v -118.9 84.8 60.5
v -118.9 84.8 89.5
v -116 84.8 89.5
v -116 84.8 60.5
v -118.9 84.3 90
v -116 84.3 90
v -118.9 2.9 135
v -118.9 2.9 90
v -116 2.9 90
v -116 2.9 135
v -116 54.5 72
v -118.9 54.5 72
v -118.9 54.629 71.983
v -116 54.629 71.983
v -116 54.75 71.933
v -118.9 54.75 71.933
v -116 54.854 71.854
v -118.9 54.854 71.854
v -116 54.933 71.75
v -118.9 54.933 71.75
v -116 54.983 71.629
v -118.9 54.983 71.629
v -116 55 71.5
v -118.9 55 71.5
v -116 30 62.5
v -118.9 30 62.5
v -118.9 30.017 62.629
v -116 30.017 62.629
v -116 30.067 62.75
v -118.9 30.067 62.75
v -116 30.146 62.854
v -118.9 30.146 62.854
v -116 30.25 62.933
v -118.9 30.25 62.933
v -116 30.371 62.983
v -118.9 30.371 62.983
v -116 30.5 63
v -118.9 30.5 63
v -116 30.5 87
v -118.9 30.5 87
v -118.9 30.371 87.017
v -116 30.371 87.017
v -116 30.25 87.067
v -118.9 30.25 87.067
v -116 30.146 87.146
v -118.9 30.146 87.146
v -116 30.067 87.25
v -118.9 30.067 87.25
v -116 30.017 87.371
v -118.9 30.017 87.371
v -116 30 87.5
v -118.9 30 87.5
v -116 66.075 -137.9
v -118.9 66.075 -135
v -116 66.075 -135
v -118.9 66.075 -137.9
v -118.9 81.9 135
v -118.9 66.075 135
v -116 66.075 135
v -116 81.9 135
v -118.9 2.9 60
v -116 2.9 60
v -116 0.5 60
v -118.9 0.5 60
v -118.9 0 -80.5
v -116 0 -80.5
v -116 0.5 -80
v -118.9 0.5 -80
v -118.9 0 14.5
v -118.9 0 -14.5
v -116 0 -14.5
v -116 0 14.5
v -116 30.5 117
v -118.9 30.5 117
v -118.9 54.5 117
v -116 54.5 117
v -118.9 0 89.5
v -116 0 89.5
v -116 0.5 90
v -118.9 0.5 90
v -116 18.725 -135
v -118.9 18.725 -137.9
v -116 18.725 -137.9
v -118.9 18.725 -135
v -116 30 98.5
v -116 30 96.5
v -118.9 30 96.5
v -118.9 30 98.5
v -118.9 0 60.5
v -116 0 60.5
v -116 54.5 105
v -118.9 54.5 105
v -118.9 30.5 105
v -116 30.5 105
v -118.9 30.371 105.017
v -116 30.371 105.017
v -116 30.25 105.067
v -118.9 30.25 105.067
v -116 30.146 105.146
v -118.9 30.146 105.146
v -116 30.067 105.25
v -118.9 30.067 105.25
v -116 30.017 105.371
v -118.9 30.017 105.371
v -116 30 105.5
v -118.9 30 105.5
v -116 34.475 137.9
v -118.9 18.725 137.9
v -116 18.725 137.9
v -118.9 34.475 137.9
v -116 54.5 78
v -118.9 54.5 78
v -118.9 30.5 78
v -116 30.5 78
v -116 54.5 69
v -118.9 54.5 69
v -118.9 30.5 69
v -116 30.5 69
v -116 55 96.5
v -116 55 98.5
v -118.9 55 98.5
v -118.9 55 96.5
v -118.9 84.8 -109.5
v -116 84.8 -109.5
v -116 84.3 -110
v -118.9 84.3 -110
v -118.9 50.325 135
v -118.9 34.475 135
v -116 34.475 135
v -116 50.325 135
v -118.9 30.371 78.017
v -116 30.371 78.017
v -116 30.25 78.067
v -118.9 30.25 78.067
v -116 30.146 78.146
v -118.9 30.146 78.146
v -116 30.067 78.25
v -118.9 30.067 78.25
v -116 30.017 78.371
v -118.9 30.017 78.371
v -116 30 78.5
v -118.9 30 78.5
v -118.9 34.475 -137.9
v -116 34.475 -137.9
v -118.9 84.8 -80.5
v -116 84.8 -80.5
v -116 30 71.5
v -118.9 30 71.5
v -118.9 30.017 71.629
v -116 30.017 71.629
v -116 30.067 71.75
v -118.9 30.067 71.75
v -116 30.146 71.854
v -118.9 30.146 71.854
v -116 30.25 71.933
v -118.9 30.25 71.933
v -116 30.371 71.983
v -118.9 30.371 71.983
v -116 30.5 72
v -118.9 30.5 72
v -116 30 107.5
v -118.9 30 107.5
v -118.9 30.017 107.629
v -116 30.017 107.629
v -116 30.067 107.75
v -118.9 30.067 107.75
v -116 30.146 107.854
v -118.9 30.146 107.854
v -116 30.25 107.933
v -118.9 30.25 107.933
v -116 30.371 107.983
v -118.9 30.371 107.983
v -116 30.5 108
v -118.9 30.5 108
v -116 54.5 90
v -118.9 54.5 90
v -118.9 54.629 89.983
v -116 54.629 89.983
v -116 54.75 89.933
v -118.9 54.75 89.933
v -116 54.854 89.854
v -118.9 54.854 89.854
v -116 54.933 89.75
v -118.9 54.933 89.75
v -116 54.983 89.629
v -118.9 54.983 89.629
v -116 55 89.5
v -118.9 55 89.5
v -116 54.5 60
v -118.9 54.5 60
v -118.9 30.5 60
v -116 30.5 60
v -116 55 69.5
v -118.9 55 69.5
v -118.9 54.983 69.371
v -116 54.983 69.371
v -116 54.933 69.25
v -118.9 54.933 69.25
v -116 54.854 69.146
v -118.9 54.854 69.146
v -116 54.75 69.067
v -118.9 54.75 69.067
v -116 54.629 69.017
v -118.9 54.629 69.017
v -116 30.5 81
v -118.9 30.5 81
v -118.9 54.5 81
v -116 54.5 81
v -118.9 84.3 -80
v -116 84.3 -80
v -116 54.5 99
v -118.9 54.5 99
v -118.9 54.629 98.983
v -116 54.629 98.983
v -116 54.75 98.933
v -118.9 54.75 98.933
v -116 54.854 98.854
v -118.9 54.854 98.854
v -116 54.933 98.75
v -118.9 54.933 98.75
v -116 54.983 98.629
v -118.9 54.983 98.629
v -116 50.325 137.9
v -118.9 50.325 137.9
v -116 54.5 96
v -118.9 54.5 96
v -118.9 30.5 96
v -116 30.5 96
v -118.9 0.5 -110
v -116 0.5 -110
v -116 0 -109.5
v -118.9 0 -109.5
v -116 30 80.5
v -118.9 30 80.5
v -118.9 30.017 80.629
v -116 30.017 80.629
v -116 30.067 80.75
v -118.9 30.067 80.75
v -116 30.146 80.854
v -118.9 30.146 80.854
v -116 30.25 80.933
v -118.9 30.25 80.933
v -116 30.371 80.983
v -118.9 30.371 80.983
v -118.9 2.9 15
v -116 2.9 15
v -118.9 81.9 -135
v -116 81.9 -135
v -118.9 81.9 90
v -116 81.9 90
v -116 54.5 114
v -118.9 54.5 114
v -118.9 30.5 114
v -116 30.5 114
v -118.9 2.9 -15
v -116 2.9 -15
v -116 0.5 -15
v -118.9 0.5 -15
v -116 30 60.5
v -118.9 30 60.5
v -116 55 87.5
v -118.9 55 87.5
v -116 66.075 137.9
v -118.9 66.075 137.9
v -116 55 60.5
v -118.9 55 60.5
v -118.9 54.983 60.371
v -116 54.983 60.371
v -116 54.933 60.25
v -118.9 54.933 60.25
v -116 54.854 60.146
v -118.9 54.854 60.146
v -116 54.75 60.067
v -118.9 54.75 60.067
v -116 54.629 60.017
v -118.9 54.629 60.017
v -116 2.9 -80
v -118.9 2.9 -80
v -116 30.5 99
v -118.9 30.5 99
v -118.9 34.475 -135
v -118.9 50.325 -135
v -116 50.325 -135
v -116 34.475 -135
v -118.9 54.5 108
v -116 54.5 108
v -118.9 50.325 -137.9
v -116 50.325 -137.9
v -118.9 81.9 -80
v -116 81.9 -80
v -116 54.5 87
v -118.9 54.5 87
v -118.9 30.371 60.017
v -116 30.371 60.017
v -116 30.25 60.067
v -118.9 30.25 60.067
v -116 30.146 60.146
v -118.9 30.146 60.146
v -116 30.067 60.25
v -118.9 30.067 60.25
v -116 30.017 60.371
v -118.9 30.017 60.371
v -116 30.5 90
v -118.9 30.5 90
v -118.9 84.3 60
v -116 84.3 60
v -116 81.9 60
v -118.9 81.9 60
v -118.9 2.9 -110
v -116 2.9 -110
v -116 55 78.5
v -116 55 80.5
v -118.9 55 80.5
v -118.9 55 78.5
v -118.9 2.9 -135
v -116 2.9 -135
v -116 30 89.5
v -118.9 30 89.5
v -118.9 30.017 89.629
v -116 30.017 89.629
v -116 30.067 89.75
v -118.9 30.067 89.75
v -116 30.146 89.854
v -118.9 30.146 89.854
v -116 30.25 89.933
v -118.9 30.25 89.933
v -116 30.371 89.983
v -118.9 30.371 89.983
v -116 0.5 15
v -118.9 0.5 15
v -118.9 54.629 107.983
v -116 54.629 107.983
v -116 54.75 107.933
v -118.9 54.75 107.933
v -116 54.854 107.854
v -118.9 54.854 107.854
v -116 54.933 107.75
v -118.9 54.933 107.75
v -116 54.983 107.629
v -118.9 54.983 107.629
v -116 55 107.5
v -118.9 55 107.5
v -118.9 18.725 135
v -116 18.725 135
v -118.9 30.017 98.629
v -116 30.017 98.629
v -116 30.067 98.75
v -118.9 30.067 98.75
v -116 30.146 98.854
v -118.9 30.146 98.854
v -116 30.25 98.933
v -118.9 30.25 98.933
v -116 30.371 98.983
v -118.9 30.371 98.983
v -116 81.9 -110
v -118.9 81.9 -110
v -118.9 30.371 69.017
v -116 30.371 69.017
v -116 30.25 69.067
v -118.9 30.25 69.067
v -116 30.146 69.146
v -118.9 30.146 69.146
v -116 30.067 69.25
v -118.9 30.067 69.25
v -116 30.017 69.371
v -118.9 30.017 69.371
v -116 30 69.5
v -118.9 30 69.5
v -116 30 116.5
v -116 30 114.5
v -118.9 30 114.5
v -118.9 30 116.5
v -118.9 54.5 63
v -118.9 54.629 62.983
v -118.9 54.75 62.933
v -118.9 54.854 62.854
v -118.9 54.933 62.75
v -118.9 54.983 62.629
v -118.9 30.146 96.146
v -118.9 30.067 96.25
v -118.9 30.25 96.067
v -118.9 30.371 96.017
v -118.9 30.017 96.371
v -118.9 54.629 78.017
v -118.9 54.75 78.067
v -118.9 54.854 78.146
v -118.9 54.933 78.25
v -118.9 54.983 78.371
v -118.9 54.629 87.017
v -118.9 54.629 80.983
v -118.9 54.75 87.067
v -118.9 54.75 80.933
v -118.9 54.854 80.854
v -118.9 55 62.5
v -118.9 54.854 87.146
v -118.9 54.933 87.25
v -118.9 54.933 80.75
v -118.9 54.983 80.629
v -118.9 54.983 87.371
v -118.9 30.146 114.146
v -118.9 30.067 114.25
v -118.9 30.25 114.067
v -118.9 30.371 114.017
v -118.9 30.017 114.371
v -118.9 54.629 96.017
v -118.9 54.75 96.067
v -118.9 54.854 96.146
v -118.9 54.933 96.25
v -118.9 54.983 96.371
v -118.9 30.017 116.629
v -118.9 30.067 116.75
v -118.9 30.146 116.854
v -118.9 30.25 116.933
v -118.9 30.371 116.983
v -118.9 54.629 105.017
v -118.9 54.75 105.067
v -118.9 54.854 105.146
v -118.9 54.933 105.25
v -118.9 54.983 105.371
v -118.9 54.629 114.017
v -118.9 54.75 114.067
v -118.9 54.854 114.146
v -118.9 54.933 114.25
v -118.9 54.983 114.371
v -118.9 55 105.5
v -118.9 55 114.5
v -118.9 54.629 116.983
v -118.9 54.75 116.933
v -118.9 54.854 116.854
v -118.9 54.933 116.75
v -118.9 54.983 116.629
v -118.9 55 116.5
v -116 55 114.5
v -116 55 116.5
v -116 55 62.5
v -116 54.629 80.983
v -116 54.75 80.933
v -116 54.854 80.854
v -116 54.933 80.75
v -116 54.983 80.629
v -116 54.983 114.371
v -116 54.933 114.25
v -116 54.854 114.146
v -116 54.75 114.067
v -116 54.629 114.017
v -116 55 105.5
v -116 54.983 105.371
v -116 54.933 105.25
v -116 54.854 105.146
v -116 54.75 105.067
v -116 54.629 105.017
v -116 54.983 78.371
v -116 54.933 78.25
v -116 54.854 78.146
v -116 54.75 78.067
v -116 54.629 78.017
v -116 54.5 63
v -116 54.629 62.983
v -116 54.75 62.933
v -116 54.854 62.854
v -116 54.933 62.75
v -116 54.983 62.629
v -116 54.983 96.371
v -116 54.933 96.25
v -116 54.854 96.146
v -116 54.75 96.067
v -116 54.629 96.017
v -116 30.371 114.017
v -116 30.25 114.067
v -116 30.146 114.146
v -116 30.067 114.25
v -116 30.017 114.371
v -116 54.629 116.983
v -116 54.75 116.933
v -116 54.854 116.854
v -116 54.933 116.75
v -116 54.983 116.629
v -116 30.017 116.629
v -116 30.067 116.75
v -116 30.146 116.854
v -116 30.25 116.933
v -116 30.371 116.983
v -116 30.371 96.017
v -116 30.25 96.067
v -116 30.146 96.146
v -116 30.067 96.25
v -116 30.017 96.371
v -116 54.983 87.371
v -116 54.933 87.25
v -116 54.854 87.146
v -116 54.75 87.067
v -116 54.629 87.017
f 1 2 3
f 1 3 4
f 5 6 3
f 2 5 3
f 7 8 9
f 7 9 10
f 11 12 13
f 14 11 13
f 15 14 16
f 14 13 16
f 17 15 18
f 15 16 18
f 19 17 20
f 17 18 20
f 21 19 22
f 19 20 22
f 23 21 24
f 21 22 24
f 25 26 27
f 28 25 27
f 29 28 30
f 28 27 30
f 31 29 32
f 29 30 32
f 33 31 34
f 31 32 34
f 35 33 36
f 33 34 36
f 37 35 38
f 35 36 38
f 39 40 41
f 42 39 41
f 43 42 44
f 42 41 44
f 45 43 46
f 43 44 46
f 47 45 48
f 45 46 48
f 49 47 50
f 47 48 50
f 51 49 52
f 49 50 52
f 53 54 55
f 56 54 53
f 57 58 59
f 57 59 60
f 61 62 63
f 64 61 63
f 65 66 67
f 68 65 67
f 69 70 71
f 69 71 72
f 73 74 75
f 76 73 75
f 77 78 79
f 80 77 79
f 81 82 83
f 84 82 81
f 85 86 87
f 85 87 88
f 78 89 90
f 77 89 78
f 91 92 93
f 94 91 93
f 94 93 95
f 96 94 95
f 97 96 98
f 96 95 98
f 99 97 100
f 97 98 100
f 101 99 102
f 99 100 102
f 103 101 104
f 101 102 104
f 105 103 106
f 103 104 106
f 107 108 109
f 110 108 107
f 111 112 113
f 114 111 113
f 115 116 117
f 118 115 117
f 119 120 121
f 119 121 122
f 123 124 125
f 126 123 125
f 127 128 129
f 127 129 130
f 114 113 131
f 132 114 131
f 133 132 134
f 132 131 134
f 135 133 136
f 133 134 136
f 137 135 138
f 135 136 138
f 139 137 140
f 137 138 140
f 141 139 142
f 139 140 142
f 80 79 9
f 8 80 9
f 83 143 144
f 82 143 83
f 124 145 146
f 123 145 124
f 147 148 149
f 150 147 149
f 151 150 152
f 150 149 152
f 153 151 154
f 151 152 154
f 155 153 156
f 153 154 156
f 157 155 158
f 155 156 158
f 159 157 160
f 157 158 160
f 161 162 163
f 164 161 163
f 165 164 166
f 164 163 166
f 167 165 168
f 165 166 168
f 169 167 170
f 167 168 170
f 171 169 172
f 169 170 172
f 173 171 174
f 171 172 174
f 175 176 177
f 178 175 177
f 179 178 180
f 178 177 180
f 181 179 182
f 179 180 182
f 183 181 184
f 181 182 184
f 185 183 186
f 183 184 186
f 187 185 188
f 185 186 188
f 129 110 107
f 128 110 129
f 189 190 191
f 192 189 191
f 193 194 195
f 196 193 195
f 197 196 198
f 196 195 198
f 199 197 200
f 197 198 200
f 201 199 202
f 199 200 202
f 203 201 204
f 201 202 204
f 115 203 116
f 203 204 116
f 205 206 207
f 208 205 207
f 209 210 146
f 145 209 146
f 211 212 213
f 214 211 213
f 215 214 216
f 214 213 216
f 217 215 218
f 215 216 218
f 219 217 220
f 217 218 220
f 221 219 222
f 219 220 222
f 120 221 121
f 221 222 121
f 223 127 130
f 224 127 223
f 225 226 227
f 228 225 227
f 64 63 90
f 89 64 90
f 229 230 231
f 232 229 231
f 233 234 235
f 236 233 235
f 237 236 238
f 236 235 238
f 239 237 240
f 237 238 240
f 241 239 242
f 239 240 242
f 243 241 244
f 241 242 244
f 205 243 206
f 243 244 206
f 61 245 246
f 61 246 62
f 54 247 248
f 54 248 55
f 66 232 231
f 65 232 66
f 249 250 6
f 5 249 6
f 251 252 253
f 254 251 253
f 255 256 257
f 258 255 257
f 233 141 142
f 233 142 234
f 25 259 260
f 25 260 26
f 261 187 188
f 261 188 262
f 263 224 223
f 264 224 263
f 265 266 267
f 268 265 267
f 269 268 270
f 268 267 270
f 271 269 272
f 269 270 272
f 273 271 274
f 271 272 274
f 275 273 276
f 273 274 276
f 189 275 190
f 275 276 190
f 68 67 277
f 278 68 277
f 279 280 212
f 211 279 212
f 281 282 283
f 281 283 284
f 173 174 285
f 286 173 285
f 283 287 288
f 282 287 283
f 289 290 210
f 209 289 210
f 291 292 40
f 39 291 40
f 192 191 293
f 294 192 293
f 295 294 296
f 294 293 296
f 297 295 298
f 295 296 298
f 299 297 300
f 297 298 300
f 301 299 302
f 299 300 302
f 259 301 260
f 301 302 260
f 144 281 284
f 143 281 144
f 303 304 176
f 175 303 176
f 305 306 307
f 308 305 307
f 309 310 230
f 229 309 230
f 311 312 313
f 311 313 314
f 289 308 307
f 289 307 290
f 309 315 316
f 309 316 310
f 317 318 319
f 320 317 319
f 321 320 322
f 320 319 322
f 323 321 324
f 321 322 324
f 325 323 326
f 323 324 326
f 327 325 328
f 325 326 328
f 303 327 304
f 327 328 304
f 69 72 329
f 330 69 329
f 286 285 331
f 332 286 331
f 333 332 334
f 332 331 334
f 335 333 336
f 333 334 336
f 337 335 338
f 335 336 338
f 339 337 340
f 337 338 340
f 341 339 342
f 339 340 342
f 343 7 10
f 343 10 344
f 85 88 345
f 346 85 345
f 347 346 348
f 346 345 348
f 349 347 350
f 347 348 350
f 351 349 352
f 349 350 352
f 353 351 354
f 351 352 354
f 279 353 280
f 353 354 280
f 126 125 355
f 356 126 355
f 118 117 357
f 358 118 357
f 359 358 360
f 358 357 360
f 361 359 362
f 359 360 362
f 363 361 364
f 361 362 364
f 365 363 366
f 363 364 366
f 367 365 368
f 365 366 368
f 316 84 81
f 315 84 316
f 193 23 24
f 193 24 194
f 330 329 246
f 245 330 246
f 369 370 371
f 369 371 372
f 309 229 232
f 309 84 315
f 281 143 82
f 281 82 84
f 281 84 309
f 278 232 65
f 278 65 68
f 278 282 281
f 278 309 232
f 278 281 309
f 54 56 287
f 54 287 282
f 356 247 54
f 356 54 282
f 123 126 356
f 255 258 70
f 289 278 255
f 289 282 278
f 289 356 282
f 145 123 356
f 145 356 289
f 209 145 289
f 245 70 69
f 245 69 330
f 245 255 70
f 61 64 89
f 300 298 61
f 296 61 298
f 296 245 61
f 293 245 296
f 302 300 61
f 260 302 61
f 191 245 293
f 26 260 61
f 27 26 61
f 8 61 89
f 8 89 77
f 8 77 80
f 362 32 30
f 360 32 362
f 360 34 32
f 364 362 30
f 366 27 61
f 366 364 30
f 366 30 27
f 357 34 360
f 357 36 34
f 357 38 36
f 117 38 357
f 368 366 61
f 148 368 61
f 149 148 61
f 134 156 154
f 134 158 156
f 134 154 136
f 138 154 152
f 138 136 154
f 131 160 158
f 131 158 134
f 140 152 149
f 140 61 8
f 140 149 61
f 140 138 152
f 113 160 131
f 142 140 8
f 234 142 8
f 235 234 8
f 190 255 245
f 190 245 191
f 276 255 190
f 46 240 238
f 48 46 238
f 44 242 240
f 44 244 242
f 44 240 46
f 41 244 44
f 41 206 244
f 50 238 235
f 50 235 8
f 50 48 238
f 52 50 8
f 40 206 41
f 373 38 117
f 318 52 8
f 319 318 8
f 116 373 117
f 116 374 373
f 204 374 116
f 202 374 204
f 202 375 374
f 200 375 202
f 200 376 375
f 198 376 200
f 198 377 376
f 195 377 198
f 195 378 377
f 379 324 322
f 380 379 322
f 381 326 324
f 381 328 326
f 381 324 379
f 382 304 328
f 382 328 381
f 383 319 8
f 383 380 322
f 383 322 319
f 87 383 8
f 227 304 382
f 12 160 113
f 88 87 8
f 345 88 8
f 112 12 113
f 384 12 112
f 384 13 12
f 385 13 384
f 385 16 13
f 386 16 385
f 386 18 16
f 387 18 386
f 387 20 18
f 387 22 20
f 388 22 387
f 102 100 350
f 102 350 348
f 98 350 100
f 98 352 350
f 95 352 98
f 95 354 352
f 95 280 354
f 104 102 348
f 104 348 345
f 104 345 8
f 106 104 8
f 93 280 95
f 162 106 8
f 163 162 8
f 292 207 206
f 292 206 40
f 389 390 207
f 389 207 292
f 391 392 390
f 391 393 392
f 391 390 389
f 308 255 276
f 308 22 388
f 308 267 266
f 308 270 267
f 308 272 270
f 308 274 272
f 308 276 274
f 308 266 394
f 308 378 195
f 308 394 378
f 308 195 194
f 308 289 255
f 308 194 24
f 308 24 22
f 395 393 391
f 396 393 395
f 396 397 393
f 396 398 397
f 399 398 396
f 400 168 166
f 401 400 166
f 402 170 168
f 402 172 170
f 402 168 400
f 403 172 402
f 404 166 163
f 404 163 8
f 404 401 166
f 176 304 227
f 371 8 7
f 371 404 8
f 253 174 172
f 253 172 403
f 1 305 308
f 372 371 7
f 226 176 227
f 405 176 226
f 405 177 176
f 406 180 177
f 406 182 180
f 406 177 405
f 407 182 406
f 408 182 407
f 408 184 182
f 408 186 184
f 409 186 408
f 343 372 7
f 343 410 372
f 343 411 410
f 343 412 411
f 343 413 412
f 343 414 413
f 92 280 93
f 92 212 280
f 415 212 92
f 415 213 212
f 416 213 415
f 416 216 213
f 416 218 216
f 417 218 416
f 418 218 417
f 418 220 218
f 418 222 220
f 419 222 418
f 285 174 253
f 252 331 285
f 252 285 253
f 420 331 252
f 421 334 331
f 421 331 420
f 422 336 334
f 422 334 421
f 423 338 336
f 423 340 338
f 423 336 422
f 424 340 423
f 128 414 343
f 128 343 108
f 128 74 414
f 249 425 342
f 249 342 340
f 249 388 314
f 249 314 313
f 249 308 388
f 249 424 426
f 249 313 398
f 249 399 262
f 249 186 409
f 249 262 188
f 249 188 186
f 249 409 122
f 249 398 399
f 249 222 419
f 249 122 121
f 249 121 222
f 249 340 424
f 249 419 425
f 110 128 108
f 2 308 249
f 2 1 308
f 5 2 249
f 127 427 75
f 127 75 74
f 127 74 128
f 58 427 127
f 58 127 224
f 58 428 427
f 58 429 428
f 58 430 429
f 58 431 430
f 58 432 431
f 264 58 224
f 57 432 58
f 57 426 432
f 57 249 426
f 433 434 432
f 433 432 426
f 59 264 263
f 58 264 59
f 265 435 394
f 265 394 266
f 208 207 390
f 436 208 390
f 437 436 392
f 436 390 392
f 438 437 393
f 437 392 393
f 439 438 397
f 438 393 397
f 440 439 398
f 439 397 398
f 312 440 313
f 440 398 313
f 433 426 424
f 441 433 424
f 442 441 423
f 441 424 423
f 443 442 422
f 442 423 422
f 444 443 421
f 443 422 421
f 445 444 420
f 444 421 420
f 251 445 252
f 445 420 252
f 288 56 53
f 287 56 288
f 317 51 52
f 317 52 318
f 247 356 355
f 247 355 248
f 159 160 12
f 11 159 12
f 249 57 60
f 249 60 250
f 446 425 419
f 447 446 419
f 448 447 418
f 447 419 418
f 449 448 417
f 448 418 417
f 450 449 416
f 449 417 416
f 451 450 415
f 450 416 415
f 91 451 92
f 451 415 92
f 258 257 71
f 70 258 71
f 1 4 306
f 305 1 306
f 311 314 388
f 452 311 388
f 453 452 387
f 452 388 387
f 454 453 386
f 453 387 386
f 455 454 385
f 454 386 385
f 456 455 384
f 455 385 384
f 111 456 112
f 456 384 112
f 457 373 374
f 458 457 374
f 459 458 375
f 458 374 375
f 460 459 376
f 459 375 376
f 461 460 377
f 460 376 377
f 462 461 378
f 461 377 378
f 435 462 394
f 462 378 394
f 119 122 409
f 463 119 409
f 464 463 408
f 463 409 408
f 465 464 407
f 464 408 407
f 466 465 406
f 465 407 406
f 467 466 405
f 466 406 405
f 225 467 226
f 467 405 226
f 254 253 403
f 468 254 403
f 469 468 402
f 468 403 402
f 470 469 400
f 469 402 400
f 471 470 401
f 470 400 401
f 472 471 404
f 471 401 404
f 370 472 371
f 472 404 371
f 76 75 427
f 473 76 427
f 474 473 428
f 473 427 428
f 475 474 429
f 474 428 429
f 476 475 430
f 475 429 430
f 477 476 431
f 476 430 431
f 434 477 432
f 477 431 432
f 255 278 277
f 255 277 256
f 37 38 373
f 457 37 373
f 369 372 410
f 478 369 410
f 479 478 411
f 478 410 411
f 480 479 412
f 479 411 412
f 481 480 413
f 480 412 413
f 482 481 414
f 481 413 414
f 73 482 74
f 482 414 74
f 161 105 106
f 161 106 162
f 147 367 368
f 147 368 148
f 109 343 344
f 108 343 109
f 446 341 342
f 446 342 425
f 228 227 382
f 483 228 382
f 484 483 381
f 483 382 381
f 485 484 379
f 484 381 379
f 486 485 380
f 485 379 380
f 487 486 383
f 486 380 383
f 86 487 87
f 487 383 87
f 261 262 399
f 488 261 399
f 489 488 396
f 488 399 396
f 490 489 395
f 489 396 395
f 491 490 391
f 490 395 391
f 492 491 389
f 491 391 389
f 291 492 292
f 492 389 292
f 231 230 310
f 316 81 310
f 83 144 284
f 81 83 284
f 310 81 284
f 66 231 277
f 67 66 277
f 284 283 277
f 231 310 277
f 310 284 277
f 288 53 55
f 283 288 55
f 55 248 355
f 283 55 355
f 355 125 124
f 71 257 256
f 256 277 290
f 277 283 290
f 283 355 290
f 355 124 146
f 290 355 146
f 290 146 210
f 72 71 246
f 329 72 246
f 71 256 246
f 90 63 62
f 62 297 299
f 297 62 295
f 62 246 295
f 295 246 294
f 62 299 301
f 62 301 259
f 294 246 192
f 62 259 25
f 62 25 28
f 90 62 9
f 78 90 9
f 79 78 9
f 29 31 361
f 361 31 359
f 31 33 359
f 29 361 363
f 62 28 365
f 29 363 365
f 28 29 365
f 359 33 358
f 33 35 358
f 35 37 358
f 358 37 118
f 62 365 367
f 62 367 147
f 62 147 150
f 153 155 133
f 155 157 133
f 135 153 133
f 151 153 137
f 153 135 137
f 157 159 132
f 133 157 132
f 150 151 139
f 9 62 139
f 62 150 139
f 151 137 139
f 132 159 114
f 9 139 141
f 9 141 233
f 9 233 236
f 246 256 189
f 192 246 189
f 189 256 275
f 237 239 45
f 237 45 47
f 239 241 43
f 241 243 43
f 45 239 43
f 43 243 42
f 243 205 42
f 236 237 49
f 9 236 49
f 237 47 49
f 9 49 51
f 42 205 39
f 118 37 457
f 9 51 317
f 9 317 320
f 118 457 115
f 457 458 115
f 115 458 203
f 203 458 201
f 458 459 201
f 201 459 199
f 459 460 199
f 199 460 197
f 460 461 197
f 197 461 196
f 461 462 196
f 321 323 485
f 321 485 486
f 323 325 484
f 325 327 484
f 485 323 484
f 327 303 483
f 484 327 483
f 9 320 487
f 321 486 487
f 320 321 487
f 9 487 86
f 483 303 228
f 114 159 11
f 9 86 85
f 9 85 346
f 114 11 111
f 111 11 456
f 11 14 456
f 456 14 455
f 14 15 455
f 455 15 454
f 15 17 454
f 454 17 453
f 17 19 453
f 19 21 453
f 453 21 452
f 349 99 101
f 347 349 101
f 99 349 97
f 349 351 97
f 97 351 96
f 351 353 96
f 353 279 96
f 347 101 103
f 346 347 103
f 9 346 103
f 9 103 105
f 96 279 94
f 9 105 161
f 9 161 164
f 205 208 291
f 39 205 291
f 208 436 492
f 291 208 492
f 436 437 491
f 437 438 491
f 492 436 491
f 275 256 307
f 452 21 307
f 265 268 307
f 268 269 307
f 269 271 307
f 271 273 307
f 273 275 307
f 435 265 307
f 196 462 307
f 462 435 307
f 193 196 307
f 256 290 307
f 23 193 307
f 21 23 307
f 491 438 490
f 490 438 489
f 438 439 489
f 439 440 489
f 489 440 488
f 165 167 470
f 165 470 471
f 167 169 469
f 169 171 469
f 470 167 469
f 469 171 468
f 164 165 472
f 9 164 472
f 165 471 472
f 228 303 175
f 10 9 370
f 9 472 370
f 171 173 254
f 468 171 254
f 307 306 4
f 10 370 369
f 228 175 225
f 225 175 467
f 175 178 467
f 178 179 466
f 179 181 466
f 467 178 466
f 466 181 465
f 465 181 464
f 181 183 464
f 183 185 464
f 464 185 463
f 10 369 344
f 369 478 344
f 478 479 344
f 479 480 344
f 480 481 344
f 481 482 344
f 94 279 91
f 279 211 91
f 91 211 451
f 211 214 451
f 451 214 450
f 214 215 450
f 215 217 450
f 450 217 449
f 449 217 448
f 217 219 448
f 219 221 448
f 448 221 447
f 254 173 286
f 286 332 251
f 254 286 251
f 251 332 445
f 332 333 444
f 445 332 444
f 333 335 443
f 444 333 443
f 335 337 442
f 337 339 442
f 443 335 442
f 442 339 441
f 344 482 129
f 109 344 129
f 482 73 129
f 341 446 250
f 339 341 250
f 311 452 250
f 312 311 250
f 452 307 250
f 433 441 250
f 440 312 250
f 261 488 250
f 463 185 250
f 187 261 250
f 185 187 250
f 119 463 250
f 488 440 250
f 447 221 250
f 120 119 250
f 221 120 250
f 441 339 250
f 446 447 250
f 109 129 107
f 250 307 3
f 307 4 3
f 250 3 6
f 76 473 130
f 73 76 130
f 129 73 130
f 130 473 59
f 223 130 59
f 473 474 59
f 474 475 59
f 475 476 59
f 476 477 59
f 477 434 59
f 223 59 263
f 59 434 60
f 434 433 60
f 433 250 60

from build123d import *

# Parameters (mm, degrees)
BOSS_EXTRUDE1_DEPTH = 2.9


with BuildPart() as part:
    # Sketch1 → Boss-Extrude1 (new body)
    with BuildSketch(Plane(origin=(-118.9, 0, 0), x_dir=(0, 0, -1), z_dir=(1, 0, 0))):
        Polygon((135, 2.9), (110, 2.9), (110, 0.5), (109.5, 0), (80.5, 0), (80, 0.5), (80, 2.9), (15, 2.9), (15, 0.5), (14.5, 0), (-14.5, 0), (-15, 0.5), (-15, 2.9), (-60, 2.9), (-60, 0.5), (-60.5, 0), (-89.5, 0), (-90, 0.5), (-90, 2.9), (-135, 2.9), (-135, 18.725), (-137.9, 18.725), (-137.9, 34.475), (-135, 34.475), (-135, 50.325), (-137.9, 50.325), (-137.9, 66.075), (-135, 66.075), (-135, 81.9), (-90, 81.9), (-90, 84.3), (-89.5, 84.8), (-60.5, 84.8), (-60, 84.3), (-60, 81.9), (80, 81.9), (80, 84.3), (80.5, 84.8), (109.5, 84.8), (110, 84.3), (110, 81.9), (135, 81.9), (135, 66.075), (137.9, 66.075), (137.9, 50.325), (135, 50.325), (135, 34.475), (137.9, 34.475), (137.9, 18.725), (135, 18.725), align=None)
        with BuildLine():
            Line((-114.5, 30), (-116.5, 30))
            ThreePointArc((-116.5, 30), (-116.853553391, 30.146446609), (-117, 30.5))
            Line((-117, 30.5), (-117, 54.5))
            ThreePointArc((-117, 54.5), (-116.853553391, 54.853553391), (-116.5, 55))
            Line((-116.5, 55), (-114.5, 55))
            ThreePointArc((-114.5, 55), (-114.146446609, 54.853553391), (-114, 54.5))
            Line((-114, 54.5), (-114, 30.5))
            ThreePointArc((-114, 30.5), (-114.146446609, 30.146446609), (-114.5, 30))
        make_face(mode=Mode.SUBTRACT)
        with BuildLine():
            Line((-105.5, 30), (-107.5, 30))
            ThreePointArc((-107.5, 30), (-107.853553391, 30.146446609), (-108, 30.5))
            Line((-108, 30.5), (-108, 54.5))
            ThreePointArc((-108, 54.5), (-107.853553391, 54.853553391), (-107.5, 55))
            Line((-107.5, 55), (-105.5, 55))
            ThreePointArc((-105.5, 55), (-105.146446609, 54.853553391), (-105, 54.5))
            Line((-105, 54.5), (-105, 30.5))
            ThreePointArc((-105, 30.5), (-105.146446609, 30.146446609), (-105.5, 30))
        make_face(mode=Mode.SUBTRACT)
        with BuildLine():
            Line((-96.5, 30), (-98.5, 30))
            ThreePointArc((-98.5, 30), (-98.853553391, 30.146446609), (-99, 30.5))
            Line((-99, 30.5), (-99, 54.5))
            ThreePointArc((-99, 54.5), (-98.853553391, 54.853553391), (-98.5, 55))
            Line((-98.5, 55), (-96.5, 55))
            ThreePointArc((-96.5, 55), (-96.146446609, 54.853553391), (-96, 54.5))
            Line((-96, 54.5), (-96, 30.5))
            ThreePointArc((-96, 30.5), (-96.146446609, 30.146446609), (-96.5, 30))
        make_face(mode=Mode.SUBTRACT)
        with BuildLine():
            Line((-87.5, 30), (-89.5, 30))
            ThreePointArc((-89.5, 30), (-89.853553391, 30.146446609), (-90, 30.5))
            Line((-90, 30.5), (-90, 54.5))
            ThreePointArc((-90, 54.5), (-89.853553391, 54.853553391), (-89.5, 55))
            Line((-89.5, 55), (-87.5, 55))
            ThreePointArc((-87.5, 55), (-87.146446609, 54.853553391), (-87, 54.5))
            Line((-87, 54.5), (-87, 30.5))
            ThreePointArc((-87, 30.5), (-87.146446609, 30.146446609), (-87.5, 30))
        make_face(mode=Mode.SUBTRACT)
        with BuildLine():
            Line((-78.5, 30), (-80.5, 30))
            ThreePointArc((-80.5, 30), (-80.853553391, 30.146446609), (-81, 30.5))
            Line((-81, 30.5), (-81, 54.5))
            ThreePointArc((-81, 54.5), (-80.853553391, 54.853553391), (-80.5, 55))
            Line((-80.5, 55), (-78.5, 55))
            ThreePointArc((-78.5, 55), (-78.146446609, 54.853553391), (-78, 54.5))
            Line((-78, 54.5), (-78, 30.5))
            ThreePointArc((-78, 30.5), (-78.146446609, 30.146446609), (-78.5, 30))
        make_face(mode=Mode.SUBTRACT)
        with BuildLine():
            Line((-69.5, 30), (-71.5, 30))
            ThreePointArc((-71.5, 30), (-71.853553391, 30.146446609), (-72, 30.5))
            Line((-72, 30.5), (-72, 54.5))
            ThreePointArc((-72, 54.5), (-71.853553391, 54.853553391), (-71.5, 55))
            Line((-71.5, 55), (-69.5, 55))
            ThreePointArc((-69.5, 55), (-69.146446609, 54.853553391), (-69, 54.5))
            Line((-69, 54.5), (-69, 30.5))
            ThreePointArc((-69, 30.5), (-69.146446609, 30.146446609), (-69.5, 30))
        make_face(mode=Mode.SUBTRACT)
        with BuildLine():
            Line((-60.5, 30), (-62.5, 30))
            ThreePointArc((-62.5, 30), (-62.853553391, 30.146446609), (-63, 30.5))
            Line((-63, 30.5), (-63, 54.5))
            ThreePointArc((-63, 54.5), (-62.853553391, 54.853553391), (-62.5, 55))
            Line((-62.5, 55), (-60.5, 55))
            ThreePointArc((-60.5, 55), (-60.146446609, 54.853553391), (-60, 54.5))
            Line((-60, 54.5), (-60, 30.5))
            ThreePointArc((-60, 30.5), (-60.146446609, 30.146446609), (-60.5, 30))
        make_face(mode=Mode.SUBTRACT)
    extrude(amount=BOSS_EXTRUDE1_DEPTH)


solid = part.part
